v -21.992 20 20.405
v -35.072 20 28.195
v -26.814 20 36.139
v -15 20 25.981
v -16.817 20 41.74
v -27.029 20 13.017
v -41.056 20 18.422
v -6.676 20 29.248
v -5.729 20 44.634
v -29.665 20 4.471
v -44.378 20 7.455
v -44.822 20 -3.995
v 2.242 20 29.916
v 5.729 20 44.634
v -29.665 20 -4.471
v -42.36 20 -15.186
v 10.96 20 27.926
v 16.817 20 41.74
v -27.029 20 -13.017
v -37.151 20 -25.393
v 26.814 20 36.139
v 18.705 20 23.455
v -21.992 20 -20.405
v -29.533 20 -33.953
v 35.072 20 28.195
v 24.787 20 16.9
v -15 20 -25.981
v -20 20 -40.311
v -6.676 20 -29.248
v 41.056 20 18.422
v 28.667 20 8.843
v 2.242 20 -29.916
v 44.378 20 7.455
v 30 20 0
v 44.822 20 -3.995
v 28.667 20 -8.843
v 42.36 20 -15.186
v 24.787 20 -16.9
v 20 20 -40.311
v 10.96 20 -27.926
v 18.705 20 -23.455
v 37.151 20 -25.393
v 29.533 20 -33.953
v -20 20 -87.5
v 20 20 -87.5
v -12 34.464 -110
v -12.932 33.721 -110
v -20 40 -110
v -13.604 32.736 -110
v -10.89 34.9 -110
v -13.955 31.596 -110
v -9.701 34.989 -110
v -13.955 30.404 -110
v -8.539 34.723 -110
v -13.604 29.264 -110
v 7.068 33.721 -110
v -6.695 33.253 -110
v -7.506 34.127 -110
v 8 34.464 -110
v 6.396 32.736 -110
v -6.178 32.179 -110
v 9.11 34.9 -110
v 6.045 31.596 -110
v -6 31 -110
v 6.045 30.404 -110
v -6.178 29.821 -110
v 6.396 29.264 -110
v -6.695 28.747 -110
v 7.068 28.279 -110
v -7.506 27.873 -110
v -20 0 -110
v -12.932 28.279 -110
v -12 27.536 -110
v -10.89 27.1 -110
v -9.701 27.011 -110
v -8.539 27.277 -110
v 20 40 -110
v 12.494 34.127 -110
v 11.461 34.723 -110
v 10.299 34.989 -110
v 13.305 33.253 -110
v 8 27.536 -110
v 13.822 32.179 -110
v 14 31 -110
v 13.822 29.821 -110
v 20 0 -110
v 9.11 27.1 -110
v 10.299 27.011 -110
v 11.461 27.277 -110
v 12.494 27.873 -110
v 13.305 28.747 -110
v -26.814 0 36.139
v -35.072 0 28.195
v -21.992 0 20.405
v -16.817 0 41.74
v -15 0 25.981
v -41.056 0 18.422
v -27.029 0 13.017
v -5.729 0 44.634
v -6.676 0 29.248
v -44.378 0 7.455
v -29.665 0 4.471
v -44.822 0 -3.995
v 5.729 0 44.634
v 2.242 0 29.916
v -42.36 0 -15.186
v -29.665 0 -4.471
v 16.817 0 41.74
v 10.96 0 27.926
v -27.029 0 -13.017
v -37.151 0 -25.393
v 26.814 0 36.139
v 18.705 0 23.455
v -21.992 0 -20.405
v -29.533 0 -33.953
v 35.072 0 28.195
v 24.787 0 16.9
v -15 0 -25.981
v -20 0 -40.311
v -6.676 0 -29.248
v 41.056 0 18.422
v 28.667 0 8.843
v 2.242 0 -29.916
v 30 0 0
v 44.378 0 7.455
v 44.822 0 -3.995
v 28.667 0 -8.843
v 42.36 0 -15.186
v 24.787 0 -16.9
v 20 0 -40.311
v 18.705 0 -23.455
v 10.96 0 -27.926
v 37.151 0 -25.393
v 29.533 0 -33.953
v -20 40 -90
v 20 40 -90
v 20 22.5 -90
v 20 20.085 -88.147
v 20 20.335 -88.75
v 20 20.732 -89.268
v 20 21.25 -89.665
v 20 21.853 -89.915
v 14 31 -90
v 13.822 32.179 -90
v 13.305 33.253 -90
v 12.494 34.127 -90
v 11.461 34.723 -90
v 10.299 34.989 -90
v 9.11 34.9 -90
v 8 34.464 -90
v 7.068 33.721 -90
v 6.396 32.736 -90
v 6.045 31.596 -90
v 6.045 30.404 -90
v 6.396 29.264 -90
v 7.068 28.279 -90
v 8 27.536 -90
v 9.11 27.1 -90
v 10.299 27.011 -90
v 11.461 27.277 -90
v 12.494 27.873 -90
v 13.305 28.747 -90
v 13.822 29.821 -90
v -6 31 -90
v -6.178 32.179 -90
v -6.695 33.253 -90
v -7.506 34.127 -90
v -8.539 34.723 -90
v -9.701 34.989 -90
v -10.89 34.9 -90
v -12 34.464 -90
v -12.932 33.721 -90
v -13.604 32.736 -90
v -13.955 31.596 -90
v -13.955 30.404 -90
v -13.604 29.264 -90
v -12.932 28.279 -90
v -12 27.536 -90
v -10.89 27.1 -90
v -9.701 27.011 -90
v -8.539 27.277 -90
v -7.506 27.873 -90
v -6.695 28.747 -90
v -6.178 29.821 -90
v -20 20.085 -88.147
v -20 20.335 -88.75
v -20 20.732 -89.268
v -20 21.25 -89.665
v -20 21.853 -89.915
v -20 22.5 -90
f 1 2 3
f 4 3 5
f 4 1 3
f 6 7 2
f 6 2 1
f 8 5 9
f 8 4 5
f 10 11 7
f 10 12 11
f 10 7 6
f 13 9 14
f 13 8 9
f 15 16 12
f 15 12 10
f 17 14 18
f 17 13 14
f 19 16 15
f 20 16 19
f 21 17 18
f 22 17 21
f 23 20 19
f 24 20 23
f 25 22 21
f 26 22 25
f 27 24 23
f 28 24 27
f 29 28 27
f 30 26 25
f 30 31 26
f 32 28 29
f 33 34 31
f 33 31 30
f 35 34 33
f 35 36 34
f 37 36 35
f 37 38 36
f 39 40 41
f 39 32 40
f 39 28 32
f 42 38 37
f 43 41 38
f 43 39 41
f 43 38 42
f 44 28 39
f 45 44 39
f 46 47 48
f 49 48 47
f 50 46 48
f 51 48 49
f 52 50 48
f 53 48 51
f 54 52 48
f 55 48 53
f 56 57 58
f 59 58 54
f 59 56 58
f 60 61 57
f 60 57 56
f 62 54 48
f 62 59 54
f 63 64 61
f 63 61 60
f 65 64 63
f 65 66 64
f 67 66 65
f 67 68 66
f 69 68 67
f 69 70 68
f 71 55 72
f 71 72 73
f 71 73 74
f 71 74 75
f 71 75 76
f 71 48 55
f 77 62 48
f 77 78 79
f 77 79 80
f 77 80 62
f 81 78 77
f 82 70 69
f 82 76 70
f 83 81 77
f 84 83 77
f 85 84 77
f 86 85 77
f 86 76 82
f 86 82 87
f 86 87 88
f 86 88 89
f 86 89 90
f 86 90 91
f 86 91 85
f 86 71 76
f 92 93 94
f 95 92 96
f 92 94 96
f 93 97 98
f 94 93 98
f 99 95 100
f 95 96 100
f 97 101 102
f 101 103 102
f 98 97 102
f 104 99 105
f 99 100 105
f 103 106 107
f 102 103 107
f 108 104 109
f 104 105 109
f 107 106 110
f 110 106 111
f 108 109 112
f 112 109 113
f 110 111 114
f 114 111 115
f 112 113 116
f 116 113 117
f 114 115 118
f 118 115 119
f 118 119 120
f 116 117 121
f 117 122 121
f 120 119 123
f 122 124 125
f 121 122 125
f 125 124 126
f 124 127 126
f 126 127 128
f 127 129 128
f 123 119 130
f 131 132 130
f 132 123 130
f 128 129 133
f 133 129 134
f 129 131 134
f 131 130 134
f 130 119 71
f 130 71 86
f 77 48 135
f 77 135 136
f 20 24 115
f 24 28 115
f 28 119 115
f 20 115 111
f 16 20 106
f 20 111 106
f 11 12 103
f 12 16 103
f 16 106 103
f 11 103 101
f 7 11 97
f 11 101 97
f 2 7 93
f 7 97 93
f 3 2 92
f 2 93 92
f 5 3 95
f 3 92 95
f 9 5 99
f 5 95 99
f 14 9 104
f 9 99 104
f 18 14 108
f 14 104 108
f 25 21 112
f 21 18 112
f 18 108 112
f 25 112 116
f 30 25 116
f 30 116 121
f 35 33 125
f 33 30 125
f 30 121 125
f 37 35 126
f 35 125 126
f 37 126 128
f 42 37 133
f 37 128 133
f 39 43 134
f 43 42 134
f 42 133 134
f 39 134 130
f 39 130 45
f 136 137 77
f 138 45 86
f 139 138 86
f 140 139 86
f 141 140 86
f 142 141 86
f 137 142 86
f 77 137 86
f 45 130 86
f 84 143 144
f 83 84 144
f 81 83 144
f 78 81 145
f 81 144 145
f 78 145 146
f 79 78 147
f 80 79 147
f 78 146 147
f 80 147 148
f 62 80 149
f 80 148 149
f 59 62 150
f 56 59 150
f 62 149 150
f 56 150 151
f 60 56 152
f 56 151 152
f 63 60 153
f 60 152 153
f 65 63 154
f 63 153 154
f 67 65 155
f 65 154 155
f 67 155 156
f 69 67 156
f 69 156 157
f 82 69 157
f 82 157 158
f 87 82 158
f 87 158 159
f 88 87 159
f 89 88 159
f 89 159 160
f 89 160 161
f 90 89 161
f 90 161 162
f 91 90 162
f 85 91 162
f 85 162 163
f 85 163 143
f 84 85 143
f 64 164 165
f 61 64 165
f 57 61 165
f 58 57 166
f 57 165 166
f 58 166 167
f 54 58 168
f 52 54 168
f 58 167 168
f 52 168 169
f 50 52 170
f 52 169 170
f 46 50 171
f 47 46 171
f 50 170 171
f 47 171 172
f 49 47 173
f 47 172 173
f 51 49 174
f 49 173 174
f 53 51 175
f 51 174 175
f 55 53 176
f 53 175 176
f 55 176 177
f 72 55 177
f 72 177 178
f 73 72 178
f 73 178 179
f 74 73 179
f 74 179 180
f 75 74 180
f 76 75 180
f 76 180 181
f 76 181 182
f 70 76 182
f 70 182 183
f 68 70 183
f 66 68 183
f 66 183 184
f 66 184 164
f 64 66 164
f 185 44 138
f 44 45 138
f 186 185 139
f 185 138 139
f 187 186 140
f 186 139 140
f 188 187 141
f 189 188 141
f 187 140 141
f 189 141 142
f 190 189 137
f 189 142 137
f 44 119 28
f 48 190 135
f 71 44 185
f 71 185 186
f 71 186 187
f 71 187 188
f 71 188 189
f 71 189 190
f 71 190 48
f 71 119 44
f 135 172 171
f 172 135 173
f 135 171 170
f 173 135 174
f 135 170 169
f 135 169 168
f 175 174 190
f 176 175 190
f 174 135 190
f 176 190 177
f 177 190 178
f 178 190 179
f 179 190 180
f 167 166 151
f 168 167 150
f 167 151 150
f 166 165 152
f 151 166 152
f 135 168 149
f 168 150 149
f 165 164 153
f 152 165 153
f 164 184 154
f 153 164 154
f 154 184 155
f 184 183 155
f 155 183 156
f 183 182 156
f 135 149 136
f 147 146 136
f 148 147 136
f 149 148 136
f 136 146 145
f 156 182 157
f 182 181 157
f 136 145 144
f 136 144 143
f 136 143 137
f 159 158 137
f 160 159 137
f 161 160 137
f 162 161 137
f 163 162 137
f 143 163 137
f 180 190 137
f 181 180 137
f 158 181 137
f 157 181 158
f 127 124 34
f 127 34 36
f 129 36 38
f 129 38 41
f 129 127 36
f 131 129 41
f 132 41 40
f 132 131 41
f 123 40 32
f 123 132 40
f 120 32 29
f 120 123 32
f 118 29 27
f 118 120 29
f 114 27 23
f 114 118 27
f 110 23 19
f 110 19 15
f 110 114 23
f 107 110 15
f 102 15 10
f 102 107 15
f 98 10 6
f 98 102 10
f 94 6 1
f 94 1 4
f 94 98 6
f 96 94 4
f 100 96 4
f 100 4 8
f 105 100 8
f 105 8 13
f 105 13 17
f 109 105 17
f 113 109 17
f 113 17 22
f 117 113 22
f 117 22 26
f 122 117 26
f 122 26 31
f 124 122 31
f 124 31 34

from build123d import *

# Parameters (mm, degrees)
SKETCH1_R           = 45
SKETCH1_R_2         = 30
BOSS_EXTRUDE1_DEPTH = 20
SKETCH2_W           = 40
SKETCH2_H           = 80
BOSS_EXTRUDE2_DEPTH = 20
SKETCH3_W           = 40
SKETCH3_H           = 20
BOSS_EXTRUDE3_DEPTH = 20
FILLET1_R           = 2.5
SKETCH4_R           = 4
CUT_EXTRUDE1_DEPTH  = 21


with BuildPart() as part:
    # Sketch1 → Boss-Extrude1 (new body)
    with BuildSketch(Plane(origin=(0, 0, 0), x_dir=(1, 0, 0), z_dir=(0, 1, 0))):
        Circle(SKETCH1_R)
        Circle(SKETCH1_R_2, mode=Mode.SUBTRACT)
    extrude(amount=BOSS_EXTRUDE1_DEPTH)

    # Sketch2 → Boss-Extrude2 (add)
    with BuildSketch(Plane(origin=(0, 0, 0), x_dir=(1, 0, 0), z_dir=(0, 1, 0))):
        with Locations((0, 70)):
            Rectangle(SKETCH2_W, SKETCH2_H)
    extrude(amount=BOSS_EXTRUDE2_DEPTH)

    # Sketch3 → Boss-Extrude3 (add)
    with BuildSketch(Plane(origin=(0, 20, 0), x_dir=(1, 0, 0), z_dir=(0, 1, 0))):
        with Locations((0, 100)):
            Rectangle(SKETCH3_W, SKETCH3_H)
    extrude(amount=BOSS_EXTRUDE3_DEPTH)

    # Fillet1
    fillet1_edges = [part.edges().sort_by_distance(p)[0] for p in [
        (0, 20, -90),
    ]]
    fillet(fillet1_edges, radius=FILLET1_R)

    # Sketch4 → Cut-Extrude1 (cut, through all)
    with BuildSketch(Plane.XY.offset(-90)):
        with Locations((10, 31)):
            Circle(SKETCH4_R)
        with Locations((-10, 31)):
            Circle(SKETCH4_R)
    extrude(amount=-CUT_EXTRUDE1_DEPTH, mode=Mode.SUBTRACT)


solid = part.part
